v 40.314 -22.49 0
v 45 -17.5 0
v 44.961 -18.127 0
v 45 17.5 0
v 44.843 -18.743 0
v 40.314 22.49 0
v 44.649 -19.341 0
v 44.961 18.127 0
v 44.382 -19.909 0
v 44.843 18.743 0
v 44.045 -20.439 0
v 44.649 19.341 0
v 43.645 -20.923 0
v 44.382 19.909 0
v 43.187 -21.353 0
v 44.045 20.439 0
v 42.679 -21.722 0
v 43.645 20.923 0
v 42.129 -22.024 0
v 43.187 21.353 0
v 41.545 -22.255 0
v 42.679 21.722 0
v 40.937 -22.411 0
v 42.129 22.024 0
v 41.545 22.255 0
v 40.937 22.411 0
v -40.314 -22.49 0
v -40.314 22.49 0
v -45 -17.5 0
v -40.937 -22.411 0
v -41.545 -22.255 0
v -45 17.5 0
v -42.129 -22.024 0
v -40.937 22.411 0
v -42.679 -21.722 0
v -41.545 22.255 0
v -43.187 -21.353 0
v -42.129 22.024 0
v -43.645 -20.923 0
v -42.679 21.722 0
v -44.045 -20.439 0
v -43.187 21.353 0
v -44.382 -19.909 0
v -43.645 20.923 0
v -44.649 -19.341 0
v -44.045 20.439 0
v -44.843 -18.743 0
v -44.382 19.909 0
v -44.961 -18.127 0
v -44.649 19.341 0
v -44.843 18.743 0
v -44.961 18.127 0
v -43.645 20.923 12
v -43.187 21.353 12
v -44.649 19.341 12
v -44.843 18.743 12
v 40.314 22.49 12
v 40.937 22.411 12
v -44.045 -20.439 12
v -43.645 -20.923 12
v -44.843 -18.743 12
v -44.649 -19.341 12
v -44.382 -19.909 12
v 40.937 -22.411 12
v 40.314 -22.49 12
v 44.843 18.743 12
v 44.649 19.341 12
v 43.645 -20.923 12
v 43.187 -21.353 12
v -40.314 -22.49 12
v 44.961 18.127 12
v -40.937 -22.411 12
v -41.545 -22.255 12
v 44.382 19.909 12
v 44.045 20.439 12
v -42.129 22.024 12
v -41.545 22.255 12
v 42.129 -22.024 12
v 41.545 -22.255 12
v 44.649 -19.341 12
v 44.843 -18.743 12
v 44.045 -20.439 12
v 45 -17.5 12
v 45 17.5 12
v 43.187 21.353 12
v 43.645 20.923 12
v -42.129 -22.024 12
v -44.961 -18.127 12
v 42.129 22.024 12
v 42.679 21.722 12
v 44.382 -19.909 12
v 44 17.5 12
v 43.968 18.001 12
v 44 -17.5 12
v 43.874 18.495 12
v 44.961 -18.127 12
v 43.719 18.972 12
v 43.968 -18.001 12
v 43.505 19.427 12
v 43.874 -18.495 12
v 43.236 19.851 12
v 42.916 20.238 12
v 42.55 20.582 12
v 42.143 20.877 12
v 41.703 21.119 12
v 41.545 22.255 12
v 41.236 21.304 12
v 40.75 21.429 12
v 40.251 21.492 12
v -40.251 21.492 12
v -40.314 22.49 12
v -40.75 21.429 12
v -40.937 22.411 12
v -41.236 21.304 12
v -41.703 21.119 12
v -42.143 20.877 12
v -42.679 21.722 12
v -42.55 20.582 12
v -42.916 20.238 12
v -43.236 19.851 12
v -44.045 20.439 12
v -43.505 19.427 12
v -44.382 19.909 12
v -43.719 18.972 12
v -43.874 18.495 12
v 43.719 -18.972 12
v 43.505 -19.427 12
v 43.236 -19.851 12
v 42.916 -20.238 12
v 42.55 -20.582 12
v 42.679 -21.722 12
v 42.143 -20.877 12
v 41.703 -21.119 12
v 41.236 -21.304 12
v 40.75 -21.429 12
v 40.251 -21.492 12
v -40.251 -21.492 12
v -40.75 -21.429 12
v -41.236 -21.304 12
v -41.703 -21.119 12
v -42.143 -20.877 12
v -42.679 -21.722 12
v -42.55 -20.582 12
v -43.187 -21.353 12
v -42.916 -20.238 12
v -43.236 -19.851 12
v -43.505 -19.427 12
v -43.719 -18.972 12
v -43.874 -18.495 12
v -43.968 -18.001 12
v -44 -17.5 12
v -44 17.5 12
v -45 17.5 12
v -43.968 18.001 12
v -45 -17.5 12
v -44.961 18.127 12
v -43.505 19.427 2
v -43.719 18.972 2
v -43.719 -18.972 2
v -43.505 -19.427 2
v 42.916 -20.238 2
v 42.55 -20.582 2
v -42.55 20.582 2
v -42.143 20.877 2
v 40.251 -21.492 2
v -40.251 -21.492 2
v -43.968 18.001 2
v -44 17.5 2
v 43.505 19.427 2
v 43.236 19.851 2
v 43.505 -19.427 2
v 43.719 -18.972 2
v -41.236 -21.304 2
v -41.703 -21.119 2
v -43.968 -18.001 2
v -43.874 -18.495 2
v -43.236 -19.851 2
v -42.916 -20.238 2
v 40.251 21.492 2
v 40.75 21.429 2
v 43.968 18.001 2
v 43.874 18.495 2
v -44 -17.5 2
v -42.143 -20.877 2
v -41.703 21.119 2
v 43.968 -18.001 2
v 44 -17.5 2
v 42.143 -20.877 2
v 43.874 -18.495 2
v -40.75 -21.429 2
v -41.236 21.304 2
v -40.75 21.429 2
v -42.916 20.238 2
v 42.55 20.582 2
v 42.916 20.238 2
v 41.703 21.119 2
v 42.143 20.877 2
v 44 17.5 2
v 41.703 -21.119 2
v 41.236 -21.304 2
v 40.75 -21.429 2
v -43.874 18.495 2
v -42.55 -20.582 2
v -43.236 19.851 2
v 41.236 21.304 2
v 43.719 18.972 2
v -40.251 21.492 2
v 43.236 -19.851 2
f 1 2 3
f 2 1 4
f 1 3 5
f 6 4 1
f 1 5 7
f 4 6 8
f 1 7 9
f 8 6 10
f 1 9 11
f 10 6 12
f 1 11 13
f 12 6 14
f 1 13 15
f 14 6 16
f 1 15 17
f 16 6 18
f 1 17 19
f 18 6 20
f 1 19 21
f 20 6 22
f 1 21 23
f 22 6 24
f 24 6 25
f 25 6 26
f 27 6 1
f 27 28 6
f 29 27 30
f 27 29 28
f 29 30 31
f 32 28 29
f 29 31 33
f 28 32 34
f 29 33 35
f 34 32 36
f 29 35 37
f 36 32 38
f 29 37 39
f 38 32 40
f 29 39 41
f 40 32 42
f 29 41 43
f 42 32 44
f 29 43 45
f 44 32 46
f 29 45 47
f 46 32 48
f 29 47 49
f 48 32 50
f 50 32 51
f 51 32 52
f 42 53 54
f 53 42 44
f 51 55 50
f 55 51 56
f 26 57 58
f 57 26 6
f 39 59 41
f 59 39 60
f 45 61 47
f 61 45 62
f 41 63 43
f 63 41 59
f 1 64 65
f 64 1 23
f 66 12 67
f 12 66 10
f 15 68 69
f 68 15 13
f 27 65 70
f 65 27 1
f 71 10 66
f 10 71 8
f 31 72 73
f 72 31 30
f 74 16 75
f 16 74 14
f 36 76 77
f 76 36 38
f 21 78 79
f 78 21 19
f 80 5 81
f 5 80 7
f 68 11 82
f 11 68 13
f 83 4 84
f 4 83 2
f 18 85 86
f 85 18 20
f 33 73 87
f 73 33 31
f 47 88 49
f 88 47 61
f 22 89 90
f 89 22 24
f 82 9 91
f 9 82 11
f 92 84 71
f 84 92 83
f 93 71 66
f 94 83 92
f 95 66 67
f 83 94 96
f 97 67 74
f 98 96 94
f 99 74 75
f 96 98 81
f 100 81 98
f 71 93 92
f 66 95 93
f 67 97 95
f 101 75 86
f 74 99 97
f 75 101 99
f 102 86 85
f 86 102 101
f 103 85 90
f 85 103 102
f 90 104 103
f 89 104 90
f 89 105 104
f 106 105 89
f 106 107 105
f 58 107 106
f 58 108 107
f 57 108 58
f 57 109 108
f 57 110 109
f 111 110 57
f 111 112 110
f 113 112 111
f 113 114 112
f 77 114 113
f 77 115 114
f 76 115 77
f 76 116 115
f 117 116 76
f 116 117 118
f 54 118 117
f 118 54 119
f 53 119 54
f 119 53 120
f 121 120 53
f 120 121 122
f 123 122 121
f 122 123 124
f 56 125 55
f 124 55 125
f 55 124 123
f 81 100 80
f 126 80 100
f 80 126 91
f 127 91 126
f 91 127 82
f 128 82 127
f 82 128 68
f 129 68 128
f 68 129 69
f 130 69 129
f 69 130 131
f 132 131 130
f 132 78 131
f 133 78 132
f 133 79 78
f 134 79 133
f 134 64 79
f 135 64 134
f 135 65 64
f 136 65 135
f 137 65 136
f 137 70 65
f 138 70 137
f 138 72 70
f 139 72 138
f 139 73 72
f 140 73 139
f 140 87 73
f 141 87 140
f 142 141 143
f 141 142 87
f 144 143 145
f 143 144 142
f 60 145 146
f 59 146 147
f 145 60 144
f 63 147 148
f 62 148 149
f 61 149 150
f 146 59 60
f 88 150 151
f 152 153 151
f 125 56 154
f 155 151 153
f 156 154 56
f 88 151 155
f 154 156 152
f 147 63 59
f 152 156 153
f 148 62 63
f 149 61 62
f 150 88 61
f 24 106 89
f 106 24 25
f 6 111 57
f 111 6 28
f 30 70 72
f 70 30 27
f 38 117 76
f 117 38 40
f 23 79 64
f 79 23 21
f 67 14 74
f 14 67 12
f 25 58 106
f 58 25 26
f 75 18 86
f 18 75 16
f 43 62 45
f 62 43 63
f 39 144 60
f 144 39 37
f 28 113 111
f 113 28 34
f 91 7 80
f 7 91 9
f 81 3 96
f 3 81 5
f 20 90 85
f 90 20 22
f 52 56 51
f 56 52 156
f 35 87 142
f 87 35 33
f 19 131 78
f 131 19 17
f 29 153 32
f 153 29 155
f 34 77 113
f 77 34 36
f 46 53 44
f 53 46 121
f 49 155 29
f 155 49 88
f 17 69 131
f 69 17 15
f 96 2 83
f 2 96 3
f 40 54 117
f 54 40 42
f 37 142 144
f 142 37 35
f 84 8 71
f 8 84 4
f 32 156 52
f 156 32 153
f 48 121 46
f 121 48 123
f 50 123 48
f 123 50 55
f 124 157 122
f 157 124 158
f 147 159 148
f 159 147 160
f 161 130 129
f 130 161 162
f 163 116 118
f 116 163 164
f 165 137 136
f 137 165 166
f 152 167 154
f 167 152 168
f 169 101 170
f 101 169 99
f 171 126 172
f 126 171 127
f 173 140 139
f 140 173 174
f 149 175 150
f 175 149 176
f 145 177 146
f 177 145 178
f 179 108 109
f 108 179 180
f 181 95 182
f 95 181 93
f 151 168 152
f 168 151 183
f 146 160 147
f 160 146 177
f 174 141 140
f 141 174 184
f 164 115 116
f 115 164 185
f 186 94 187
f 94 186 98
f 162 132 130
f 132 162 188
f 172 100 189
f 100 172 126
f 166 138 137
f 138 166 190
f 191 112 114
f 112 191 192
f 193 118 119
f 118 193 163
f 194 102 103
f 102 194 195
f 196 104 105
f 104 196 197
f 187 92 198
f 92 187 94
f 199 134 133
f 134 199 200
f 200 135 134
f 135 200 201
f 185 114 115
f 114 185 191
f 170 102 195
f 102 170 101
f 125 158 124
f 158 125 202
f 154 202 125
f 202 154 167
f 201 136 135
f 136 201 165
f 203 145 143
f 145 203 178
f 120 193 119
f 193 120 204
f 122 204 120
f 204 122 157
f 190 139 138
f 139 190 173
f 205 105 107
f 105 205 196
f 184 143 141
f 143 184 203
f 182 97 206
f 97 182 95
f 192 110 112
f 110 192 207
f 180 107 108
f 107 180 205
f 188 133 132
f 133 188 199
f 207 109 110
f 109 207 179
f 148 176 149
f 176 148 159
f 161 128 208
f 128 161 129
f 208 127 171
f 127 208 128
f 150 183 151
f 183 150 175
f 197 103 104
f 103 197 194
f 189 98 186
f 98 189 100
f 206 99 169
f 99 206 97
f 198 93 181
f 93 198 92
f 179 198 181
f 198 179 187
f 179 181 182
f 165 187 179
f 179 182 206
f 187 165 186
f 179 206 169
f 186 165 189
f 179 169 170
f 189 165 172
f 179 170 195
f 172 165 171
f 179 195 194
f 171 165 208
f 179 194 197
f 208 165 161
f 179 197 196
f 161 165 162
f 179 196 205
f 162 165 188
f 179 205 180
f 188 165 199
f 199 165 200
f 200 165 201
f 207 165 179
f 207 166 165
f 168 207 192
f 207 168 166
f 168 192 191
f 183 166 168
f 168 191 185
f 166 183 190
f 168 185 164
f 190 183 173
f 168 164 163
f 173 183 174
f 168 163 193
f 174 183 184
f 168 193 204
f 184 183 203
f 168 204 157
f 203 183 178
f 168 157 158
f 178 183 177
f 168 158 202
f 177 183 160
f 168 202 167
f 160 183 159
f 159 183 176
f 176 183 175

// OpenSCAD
$fn = 50;


difference() {
	union() {
		hull() {
			translate(v = [-40.0000000000, 17.5000000000, 0]) {
				cylinder(h = 12, r = 5);
			}
			translate(v = [40.0000000000, 17.5000000000, 0]) {
				cylinder(h = 12, r = 5);
			}
			translate(v = [-40.0000000000, -17.5000000000, 0]) {
				cylinder(h = 12, r = 5);
			}
			translate(v = [40.0000000000, -17.5000000000, 0]) {
				cylinder(h = 12, r = 5);
			}
		}
	}
	union() {
		translate(v = [0, 0, 2]) {
			hull() {
				translate(v = [-40.0000000000, 17.5000000000, 0]) {
					cylinder(h = 10, r = 4);
				}
				translate(v = [40.0000000000, 17.5000000000, 0]) {
					cylinder(h = 10, r = 4);
				}
				translate(v = [-40.0000000000, -17.5000000000, 0]) {
					cylinder(h = 10, r = 4);
				}
				translate(v = [40.0000000000, -17.5000000000, 0]) {
					cylinder(h = 10, r = 4);
				}
			}
		}
	}
}
